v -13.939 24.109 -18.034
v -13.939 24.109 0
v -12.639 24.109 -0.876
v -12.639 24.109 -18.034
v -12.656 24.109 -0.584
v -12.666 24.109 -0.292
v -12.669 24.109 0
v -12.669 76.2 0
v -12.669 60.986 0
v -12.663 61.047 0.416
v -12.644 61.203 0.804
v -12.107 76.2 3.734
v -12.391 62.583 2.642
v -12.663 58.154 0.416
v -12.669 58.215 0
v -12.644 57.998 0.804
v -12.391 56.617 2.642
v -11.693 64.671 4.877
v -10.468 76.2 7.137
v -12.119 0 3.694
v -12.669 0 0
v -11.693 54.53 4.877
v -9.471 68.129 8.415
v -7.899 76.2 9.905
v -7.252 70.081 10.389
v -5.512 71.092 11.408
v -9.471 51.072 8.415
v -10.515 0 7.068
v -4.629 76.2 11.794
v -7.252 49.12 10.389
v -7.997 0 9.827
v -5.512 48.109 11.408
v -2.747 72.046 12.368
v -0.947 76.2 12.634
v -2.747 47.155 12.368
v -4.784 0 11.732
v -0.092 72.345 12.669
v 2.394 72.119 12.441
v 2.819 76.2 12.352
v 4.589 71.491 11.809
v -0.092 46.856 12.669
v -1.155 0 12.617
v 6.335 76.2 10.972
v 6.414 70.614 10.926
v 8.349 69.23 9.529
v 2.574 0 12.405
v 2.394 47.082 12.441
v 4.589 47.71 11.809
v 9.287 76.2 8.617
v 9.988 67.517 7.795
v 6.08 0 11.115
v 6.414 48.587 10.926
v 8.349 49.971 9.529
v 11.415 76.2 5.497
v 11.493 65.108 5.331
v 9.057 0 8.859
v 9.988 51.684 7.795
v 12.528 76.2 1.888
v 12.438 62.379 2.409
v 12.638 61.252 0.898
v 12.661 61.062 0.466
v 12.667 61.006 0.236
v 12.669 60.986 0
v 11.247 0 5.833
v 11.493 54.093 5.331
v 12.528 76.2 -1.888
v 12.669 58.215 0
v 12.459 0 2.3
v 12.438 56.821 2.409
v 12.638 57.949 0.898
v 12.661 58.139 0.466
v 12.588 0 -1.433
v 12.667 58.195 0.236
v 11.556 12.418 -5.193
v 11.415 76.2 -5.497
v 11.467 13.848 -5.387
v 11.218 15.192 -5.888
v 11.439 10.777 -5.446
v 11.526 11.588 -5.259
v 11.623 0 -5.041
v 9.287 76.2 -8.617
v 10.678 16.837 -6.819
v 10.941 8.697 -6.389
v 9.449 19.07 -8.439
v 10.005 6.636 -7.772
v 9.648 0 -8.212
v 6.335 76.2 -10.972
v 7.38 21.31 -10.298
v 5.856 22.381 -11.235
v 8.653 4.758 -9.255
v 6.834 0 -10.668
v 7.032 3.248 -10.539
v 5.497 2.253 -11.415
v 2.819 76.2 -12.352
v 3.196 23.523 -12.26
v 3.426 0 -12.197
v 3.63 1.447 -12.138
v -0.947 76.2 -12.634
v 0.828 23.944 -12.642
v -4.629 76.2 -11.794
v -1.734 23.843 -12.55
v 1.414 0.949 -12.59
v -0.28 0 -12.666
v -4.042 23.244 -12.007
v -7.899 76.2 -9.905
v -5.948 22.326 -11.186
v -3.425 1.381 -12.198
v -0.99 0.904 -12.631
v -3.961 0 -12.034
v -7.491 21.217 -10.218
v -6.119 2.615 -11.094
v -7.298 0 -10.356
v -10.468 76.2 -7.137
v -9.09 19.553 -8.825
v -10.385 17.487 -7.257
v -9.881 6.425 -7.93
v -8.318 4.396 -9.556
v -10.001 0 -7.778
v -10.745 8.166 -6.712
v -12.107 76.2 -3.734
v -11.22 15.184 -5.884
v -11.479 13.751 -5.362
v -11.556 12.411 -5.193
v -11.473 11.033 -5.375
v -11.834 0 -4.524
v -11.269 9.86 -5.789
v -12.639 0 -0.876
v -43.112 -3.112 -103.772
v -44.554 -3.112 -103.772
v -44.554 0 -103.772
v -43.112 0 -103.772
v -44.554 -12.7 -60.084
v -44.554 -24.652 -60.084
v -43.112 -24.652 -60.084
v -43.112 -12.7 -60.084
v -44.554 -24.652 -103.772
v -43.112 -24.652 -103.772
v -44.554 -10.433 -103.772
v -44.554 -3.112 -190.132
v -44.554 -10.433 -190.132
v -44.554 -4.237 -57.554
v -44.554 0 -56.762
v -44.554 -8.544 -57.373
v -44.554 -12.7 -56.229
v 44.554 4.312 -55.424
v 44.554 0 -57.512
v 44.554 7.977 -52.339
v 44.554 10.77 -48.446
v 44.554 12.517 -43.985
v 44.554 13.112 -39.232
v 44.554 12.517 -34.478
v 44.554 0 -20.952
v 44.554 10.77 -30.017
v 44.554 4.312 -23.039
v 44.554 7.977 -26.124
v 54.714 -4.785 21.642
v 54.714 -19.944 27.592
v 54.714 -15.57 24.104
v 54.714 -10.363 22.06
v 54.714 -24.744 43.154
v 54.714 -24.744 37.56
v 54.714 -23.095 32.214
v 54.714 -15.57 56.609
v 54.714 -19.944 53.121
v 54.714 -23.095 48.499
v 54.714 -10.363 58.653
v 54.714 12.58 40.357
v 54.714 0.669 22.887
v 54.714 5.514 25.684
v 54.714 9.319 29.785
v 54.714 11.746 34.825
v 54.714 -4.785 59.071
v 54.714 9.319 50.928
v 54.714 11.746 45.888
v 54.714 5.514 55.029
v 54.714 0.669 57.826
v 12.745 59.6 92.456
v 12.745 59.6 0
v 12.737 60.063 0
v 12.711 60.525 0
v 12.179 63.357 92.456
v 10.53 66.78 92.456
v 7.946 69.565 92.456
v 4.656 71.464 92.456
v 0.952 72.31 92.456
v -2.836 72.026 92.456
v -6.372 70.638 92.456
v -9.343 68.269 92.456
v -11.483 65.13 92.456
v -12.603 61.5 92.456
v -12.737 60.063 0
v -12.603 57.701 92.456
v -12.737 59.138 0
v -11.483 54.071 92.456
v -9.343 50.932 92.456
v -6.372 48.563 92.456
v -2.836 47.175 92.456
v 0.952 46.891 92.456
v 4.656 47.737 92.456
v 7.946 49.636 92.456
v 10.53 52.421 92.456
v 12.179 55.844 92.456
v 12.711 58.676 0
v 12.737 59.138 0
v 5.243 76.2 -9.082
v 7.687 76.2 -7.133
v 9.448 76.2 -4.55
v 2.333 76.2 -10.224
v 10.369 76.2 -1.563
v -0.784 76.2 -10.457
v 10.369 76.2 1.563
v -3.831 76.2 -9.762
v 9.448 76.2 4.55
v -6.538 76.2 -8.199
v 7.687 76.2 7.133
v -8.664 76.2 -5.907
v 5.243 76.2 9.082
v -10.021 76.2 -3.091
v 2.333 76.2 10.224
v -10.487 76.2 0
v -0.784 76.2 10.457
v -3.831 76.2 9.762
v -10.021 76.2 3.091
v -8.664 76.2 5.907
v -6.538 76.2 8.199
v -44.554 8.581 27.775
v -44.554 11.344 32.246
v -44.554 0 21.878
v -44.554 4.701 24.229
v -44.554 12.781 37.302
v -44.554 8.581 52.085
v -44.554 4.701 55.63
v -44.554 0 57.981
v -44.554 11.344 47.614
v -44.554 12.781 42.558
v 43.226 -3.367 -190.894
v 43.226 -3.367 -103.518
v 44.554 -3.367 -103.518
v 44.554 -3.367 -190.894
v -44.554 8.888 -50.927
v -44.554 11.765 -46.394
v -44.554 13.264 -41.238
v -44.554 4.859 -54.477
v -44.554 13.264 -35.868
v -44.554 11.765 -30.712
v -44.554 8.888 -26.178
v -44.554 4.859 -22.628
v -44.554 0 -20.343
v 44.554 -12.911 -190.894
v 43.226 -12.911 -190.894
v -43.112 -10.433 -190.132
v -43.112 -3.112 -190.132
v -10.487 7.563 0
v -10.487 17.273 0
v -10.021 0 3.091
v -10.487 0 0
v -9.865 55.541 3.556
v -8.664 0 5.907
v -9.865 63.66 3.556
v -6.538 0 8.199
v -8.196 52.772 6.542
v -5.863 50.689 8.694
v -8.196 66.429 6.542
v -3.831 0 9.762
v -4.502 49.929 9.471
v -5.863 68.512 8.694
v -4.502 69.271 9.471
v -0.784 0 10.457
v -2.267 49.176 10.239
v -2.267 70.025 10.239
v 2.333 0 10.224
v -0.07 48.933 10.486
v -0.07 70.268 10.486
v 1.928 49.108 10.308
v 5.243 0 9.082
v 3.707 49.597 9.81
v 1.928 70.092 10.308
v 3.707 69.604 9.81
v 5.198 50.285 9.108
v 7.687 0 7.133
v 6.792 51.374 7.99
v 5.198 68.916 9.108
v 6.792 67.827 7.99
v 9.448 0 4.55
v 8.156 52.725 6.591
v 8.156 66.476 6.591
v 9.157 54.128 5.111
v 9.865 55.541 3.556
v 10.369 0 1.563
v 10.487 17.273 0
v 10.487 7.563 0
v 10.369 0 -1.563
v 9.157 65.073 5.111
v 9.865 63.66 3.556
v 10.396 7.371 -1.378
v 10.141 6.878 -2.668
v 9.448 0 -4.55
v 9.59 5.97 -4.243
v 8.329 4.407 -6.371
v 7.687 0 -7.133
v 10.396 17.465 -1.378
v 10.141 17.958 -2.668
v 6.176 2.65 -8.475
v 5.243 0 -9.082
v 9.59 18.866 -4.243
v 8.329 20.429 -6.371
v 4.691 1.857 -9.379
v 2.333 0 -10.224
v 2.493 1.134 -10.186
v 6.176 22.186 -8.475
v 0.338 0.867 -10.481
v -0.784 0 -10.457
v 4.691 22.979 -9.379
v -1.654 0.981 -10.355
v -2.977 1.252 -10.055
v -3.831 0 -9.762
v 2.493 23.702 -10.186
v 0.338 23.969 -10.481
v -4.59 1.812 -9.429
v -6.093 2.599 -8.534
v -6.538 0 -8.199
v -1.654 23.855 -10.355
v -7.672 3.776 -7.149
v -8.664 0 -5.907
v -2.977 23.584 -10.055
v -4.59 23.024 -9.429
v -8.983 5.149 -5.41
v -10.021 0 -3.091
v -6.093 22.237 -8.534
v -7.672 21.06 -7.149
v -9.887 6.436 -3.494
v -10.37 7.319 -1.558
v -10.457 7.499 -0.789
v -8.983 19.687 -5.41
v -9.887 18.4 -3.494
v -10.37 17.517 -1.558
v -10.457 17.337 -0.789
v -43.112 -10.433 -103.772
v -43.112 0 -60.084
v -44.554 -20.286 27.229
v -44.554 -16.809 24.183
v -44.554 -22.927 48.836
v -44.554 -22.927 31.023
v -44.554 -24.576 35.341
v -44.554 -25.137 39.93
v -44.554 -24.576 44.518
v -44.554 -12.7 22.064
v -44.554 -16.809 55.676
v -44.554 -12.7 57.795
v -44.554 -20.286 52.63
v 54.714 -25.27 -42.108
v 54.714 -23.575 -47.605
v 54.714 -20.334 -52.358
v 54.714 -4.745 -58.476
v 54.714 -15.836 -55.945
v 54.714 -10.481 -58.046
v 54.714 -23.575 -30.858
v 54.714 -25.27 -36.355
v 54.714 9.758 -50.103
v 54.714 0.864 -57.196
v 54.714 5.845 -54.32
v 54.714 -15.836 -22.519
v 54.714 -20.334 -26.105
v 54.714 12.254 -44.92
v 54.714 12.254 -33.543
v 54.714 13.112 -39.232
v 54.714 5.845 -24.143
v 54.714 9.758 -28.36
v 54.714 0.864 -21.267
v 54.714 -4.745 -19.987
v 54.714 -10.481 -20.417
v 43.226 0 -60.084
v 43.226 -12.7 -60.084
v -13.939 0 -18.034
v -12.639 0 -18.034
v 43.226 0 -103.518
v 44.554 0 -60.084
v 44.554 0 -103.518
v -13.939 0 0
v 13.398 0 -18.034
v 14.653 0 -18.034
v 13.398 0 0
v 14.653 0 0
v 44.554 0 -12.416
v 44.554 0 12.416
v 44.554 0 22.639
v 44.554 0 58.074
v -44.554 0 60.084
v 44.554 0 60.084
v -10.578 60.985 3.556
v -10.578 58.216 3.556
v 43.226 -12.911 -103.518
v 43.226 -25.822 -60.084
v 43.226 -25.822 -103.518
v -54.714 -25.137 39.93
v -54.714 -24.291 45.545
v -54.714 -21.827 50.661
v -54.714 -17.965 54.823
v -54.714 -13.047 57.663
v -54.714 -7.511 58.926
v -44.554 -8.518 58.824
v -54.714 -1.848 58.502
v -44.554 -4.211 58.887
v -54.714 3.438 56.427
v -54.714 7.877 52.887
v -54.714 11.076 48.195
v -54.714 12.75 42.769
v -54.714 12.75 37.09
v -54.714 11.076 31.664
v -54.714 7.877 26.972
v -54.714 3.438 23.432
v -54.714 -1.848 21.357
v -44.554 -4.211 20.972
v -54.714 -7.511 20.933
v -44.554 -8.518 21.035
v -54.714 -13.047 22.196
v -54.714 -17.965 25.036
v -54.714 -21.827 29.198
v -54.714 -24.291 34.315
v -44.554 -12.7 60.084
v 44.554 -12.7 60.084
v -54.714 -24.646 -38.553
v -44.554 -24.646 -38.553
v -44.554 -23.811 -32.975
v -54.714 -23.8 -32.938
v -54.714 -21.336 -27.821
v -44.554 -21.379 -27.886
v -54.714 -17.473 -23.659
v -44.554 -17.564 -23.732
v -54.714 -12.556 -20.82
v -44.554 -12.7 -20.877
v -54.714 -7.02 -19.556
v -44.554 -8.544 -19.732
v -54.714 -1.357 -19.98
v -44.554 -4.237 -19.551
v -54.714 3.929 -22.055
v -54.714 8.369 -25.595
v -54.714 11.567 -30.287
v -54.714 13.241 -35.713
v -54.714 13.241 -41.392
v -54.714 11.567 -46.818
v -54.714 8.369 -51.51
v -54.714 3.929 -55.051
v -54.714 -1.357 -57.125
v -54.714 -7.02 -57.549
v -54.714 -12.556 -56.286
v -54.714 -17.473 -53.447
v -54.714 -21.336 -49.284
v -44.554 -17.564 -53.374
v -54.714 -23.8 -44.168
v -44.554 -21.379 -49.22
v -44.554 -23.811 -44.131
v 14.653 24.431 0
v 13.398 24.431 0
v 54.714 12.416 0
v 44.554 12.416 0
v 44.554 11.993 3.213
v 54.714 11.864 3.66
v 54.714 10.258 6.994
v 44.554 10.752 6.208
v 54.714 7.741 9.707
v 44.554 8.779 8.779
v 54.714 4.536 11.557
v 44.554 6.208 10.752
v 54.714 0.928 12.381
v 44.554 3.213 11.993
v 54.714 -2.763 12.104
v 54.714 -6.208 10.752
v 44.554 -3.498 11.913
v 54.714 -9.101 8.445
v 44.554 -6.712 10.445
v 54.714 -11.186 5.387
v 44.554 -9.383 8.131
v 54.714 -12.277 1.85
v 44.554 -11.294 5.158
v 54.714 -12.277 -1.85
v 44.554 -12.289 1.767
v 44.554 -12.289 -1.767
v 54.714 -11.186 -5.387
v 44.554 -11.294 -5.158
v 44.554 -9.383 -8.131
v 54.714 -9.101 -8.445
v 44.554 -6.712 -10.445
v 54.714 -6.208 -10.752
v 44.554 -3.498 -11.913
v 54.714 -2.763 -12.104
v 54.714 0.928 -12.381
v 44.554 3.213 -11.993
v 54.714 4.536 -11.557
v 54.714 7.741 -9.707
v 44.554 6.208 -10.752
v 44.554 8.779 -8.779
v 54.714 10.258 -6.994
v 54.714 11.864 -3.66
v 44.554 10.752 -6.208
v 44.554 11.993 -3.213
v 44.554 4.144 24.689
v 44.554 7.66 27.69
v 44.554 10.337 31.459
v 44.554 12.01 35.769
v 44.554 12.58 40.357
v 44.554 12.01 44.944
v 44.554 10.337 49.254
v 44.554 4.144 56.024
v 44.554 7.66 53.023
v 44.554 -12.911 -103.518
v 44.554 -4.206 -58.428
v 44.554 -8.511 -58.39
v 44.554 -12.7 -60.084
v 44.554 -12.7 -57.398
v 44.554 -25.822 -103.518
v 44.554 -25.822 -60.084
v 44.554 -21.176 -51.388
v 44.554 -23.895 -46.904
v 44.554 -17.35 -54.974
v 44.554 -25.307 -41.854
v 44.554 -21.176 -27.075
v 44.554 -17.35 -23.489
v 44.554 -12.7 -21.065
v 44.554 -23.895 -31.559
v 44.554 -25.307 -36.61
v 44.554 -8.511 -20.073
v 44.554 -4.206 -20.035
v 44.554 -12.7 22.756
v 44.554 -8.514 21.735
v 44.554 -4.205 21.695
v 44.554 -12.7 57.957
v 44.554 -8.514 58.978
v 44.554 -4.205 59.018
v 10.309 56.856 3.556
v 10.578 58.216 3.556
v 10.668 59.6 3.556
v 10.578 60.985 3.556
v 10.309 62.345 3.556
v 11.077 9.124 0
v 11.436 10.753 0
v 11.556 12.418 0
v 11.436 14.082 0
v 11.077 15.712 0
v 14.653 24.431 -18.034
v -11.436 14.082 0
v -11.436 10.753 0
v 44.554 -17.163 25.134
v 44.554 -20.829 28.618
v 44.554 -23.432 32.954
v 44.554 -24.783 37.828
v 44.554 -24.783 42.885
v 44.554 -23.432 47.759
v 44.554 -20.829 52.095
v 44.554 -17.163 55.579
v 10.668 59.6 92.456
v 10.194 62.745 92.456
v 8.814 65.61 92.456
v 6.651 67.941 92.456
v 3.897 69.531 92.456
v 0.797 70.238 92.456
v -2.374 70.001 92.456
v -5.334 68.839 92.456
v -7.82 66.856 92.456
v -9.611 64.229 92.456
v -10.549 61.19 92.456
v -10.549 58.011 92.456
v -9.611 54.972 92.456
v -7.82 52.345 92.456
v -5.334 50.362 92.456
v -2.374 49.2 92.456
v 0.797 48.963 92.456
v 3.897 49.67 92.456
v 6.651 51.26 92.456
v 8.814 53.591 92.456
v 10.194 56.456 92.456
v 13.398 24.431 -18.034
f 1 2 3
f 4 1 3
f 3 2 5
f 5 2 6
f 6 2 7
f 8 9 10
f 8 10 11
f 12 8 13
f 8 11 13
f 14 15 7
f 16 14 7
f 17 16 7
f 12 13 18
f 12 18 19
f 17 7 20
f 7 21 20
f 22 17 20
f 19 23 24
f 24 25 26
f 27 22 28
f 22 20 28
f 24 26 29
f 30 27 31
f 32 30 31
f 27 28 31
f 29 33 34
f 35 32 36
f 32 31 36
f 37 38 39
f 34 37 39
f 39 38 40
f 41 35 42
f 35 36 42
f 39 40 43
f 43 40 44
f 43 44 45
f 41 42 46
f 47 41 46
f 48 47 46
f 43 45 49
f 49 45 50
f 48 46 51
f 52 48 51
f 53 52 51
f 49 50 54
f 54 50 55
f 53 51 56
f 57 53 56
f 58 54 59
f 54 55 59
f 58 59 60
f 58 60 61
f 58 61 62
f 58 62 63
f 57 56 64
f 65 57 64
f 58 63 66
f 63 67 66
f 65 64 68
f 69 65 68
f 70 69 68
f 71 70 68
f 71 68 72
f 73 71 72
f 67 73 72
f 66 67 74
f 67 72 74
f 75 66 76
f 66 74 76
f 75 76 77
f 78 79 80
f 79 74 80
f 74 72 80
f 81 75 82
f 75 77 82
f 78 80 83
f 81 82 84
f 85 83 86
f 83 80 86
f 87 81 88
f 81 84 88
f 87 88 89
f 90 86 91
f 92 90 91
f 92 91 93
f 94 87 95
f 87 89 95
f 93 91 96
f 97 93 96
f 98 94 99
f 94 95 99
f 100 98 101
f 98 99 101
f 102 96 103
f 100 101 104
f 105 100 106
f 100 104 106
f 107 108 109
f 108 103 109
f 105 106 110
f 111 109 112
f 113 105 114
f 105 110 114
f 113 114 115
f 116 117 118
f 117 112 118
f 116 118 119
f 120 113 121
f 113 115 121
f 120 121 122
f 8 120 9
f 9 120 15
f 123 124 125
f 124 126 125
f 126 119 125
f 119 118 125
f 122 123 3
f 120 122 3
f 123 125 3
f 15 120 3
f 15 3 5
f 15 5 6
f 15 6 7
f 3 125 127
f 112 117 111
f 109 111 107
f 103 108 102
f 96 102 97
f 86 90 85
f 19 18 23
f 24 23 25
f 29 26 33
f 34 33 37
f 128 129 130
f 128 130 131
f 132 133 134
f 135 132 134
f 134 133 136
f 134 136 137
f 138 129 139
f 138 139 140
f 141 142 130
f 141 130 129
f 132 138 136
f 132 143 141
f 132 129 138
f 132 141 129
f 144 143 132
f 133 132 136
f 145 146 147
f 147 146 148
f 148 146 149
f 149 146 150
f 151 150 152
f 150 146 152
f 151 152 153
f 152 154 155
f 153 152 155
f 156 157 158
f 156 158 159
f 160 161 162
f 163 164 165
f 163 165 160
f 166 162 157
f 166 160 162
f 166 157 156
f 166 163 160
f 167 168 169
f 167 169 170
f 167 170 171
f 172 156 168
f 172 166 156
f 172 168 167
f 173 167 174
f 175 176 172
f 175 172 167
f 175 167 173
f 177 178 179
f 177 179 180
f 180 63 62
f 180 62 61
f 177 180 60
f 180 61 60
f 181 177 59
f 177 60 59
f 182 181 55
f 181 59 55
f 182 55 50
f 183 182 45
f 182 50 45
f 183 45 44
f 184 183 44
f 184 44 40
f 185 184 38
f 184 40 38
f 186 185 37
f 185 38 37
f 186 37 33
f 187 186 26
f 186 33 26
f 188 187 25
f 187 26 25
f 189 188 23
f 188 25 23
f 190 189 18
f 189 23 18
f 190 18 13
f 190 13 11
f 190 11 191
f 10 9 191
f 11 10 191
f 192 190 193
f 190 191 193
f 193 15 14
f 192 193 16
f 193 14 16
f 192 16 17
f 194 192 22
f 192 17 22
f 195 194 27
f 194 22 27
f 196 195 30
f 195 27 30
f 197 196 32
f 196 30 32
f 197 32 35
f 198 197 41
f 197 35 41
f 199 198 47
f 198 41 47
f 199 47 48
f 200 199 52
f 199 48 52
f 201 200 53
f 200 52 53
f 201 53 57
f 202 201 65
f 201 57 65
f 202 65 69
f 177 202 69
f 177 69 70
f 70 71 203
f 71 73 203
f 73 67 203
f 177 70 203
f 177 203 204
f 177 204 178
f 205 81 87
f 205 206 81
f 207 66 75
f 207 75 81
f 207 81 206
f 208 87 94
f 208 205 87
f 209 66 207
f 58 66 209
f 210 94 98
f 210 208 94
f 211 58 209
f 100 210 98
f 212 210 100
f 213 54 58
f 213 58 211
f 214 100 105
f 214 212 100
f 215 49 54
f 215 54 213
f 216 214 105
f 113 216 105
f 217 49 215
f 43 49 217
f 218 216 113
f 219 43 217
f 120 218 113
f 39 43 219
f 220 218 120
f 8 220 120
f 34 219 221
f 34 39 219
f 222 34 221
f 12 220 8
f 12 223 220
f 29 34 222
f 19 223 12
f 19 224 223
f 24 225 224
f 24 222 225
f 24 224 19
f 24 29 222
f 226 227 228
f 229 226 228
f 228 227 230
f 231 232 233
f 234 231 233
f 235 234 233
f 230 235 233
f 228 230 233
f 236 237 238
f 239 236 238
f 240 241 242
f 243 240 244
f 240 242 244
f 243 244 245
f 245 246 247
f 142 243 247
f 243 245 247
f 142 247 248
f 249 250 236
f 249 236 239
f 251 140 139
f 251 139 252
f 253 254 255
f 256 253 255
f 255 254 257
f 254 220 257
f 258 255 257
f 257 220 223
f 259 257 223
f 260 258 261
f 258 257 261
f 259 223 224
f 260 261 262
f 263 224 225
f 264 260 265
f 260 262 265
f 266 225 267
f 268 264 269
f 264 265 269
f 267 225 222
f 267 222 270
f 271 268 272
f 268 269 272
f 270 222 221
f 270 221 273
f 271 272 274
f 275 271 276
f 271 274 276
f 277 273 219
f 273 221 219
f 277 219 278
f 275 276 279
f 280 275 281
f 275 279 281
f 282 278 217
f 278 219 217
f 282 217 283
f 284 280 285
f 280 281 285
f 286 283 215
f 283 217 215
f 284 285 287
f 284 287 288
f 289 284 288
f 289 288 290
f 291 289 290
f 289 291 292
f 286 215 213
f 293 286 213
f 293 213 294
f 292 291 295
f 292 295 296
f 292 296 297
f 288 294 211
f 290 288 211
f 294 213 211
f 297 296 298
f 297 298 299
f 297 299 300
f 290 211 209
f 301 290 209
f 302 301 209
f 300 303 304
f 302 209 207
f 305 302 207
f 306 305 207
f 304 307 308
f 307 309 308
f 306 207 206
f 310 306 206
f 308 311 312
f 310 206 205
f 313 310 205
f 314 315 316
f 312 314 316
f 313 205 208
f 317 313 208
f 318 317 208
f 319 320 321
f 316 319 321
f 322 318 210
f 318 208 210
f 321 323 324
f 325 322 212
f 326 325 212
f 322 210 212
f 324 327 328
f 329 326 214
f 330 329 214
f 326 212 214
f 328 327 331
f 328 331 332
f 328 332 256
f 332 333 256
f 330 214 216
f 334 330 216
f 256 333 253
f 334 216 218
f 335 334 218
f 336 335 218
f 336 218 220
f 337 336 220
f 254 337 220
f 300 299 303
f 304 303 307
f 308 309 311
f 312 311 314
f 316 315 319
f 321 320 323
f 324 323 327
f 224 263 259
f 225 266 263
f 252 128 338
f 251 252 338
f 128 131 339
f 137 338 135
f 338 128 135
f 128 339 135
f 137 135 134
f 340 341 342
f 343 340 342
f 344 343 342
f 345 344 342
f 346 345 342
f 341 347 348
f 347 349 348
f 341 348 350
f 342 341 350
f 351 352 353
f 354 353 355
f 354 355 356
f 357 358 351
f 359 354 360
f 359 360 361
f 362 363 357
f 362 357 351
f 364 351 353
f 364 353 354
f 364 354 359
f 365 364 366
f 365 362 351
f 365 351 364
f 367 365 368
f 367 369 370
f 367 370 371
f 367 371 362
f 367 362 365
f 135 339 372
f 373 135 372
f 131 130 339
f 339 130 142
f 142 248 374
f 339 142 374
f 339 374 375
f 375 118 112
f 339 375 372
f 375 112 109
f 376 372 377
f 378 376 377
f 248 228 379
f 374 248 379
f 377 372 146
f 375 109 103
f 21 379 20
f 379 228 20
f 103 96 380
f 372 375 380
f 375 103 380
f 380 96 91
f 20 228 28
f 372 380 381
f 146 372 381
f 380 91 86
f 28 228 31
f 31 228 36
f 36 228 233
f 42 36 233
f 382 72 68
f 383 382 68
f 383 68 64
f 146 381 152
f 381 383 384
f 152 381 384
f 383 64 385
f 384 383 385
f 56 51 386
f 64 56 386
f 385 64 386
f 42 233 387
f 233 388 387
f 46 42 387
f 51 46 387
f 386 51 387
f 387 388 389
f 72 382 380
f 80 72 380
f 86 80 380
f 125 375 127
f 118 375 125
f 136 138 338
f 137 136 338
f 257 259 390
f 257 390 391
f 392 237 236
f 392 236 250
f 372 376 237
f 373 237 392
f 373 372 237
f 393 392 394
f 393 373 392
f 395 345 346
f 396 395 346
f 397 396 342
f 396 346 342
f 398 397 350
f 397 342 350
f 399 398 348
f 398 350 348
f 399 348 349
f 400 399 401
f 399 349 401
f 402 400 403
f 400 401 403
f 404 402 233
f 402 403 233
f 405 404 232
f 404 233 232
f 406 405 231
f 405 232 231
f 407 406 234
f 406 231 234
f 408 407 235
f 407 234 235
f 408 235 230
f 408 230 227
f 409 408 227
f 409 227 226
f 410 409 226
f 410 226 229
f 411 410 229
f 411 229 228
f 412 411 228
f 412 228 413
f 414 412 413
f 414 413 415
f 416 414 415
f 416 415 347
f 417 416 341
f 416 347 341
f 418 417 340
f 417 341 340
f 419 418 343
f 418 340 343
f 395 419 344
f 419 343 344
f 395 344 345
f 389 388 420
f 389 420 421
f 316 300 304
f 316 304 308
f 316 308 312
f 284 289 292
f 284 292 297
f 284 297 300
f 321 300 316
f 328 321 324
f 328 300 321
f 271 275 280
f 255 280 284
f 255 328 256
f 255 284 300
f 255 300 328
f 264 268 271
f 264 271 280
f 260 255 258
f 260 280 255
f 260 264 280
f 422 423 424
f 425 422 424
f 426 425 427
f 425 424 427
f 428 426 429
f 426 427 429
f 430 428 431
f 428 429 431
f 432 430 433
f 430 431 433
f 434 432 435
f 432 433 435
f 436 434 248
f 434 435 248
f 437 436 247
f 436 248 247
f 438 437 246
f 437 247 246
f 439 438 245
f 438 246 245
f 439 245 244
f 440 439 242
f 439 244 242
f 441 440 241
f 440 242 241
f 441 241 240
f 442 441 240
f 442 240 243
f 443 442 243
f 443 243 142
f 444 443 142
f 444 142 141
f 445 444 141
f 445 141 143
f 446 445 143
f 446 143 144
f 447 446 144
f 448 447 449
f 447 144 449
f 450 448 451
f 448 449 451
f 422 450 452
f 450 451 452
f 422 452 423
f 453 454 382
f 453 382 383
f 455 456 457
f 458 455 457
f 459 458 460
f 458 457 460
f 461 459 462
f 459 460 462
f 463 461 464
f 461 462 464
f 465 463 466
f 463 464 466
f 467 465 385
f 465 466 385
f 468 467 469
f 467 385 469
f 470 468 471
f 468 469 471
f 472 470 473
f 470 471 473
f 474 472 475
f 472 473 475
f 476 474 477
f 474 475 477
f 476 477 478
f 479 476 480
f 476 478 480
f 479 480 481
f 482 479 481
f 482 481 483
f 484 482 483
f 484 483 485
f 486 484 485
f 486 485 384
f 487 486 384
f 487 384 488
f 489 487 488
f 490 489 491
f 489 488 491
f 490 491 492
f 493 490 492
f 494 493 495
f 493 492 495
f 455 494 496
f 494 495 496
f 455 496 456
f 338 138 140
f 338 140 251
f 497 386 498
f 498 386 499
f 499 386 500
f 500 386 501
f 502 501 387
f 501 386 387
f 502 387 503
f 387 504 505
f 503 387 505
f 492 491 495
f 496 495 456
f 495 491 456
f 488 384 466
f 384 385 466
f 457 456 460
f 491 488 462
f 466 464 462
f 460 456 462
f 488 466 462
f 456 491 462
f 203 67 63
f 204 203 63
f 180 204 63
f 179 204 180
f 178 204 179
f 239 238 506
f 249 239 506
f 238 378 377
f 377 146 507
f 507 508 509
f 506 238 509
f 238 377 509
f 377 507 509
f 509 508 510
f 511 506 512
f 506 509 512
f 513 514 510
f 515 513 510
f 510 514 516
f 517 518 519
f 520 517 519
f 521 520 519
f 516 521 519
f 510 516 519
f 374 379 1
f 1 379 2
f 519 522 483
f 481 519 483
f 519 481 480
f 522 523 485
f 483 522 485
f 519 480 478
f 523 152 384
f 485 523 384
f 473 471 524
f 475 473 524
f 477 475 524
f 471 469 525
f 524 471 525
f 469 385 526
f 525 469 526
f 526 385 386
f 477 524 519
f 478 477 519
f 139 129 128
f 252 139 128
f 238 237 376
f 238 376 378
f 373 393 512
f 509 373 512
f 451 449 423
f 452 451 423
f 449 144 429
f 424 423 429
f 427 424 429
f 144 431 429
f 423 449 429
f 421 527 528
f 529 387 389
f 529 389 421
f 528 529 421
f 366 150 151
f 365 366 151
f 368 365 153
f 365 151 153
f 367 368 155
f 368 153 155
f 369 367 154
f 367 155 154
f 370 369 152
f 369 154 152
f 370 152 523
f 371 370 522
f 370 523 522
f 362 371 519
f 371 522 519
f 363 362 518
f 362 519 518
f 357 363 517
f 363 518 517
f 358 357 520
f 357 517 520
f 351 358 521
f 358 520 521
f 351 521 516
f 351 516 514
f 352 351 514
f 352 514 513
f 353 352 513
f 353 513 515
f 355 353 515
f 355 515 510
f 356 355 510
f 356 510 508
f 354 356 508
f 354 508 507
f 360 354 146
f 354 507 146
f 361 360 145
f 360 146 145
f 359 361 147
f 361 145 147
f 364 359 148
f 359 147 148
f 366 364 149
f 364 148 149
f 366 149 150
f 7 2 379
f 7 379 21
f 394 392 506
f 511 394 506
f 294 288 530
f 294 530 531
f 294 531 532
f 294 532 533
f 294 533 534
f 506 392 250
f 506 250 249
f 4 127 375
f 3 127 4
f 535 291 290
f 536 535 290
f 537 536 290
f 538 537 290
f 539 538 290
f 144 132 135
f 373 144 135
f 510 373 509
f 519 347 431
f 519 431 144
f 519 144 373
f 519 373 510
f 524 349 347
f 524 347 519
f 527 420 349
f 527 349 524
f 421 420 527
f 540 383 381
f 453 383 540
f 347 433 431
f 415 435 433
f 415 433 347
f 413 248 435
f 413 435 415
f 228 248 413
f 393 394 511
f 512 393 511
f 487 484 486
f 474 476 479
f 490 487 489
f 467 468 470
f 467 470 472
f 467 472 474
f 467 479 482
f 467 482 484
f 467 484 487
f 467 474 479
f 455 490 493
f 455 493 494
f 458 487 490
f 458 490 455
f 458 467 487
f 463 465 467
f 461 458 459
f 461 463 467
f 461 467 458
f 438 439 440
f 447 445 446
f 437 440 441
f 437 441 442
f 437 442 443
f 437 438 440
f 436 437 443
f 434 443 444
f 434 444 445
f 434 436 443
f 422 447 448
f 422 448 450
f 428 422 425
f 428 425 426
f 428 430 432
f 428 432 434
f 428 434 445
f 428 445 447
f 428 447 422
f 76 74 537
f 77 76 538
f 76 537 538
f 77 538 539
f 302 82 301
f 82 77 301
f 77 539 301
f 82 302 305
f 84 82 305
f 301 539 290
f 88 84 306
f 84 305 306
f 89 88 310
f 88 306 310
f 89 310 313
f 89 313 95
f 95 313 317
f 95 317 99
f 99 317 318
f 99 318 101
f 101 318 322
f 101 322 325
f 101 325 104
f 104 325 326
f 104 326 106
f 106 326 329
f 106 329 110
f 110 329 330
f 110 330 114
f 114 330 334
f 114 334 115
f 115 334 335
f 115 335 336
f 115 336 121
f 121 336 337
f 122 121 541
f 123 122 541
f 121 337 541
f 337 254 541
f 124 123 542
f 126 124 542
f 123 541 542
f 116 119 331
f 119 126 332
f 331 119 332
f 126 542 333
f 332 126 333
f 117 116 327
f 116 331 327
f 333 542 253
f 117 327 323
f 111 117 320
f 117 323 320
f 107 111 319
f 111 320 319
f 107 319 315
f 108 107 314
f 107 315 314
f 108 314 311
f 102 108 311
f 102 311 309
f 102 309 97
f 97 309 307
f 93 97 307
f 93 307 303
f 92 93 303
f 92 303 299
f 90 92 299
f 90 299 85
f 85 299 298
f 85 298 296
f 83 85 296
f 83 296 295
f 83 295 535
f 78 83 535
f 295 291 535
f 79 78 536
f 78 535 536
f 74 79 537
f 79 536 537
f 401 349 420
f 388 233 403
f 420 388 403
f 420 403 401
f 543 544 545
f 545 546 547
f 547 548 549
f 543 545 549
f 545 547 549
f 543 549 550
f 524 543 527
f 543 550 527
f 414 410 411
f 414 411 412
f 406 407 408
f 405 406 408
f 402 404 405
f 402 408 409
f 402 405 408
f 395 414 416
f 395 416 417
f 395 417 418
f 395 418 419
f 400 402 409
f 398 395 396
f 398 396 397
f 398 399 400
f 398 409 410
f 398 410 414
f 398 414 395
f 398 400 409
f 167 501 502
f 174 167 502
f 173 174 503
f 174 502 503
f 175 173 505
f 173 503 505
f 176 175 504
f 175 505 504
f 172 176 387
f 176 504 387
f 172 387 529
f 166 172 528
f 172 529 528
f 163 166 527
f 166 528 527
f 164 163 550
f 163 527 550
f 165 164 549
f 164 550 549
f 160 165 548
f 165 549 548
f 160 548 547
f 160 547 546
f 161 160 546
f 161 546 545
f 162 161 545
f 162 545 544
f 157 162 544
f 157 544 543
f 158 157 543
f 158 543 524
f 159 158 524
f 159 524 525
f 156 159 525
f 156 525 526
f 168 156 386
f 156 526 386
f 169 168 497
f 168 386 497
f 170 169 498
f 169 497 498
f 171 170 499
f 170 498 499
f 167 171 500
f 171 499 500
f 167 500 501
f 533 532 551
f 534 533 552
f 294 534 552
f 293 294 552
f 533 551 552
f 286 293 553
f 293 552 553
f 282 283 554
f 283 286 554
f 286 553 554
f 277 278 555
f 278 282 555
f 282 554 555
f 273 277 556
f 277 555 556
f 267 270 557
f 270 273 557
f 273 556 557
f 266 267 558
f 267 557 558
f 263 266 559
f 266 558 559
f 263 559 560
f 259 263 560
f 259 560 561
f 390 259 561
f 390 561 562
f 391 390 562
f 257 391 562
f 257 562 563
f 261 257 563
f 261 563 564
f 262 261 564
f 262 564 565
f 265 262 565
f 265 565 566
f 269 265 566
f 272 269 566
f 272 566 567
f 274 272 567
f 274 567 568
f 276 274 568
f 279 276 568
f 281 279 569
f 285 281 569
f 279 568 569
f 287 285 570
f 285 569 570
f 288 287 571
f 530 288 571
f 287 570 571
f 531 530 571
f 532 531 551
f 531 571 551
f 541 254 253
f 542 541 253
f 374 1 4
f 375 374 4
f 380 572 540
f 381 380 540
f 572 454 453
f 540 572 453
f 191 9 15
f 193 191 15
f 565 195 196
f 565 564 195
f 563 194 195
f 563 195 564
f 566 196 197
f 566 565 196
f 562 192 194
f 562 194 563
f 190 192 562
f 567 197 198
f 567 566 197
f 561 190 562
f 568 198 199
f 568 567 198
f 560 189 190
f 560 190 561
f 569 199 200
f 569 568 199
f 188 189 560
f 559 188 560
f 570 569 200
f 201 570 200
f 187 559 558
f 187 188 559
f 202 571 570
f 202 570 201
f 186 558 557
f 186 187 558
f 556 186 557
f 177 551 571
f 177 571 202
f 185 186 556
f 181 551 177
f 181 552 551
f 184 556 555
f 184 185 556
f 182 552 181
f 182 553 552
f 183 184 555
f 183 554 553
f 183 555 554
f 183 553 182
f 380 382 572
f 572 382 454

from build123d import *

# Parameters (mm, degrees)
F0_W      = 89.10818398
F0_H      = 120.1675757766
F1_DEPTH  = 12.7
F2_R      = 19.05
F3_DEPTH  = 10.16
F4_R      = 19.05
F5_DEPTH  = 10.16
F6_R      = 18.7667167596
F7_DEPTH  = 10.16
F8_R      = 19.2986234131
F9_DEPTH  = 10.16
F10_R     = 12.4156573735
F11_DEPTH = 10.16
F12_R     = 12.6694142054
F13_DEPTH = 76.2
F14_R     = 12.7449680287
F15_DEPTH = 92.456
F16_R     = 10.4865516495
F17_DEPTH = 76.2
F18_R     = 10.6677127508
F19_DEPTH = 88.9
F20_R     = 11.5560475943
F21_DEPTH = 25.4
F24_W     = 1.3282671571
F24_H     = 25.8222837001
F25_DEPTH = 43.434
F26_W     = 1.4417506754
F26_H     = 24.6515385807
F27_DEPTH = 43.688
F22_W     = 1.255504787
F22_H     = 24.4307331741
F30_DEPTH = 18.034
F23_W     = 1.2999391183
F23_H     = 24.1094622761
F31_DEPTH = 18.034
F36_W     = 1.3282671571
F36_H     = 9.5440435689
F37_DEPTH = 87.376
F38_W     = 1.4417506754
F38_H     = 7.3205276858
F39_DEPTH = 86.36


# Not quite as in the source:
# - the program builds the solid bodies; features that only make, move or delete a surface that nothing else refers to are left out


with BuildPart() as f1:
    # F0 (on Front) → F1 (new body)
    with BuildSketch(Plane.XZ):
        Rectangle(F0_W, F0_H)
    extrude(amount=F1_DEPTH)

    # F2 (on face) → F3 (join)
    with BuildSketch(Plane(origin=(-44.55409199, 0, 0), x_dir=(0, -1, 0), z_dir=(-1, 0, 0))):
        with Locations((6.0873422772, 39.9295948446)):
            Circle(F2_R)
    extrude(amount=F3_DEPTH)

    # F4 (on face) → F5 (join)
    with BuildSketch(Plane(origin=(-44.55409199, 0, 0), x_dir=(0, -1, 0), z_dir=(-1, 0, 0))):
        with Locations((5.5960081518, -38.5527424514)):
            Circle(F4_R)
    extrude(amount=F5_DEPTH)

    # F6 (on face) → F7 (join)
    with BuildSketch(Plane.YZ.offset(44.55409199)):
        with Locations((-6.1870645732, 40.3565391898)):
            Circle(F6_R)
    extrude(amount=F7_DEPTH)

    # F8 (on face) → F9 (join)
    with BuildSketch(Plane.YZ.offset(44.55409199)):
        with Locations((-6.1870645732, -39.2316170037)):
            Circle(F8_R)
    extrude(amount=F9_DEPTH)

    # F10 (on face) → F11 (join)
    with BuildSketch(Plane.YZ.offset(44.55409199)):
        Circle(F10_R)
    extrude(amount=F11_DEPTH)

    # F12 (on face) → F13 (join)
    with BuildSketch(Plane(origin=(0, 0, 0), x_dir=(-1, 0, 0), z_dir=(0, 1, 0))):
        Circle(F12_R)
    extrude(amount=F13_DEPTH)

    # F14 (on Top) → F15 (join)
    with BuildSketch(Plane.XY):
        with Locations((0, 59.6004612744)):
            Circle(F14_R)
    extrude(amount=F15_DEPTH)

    # F16 (on face) → F17 (cut)
    with BuildSketch(Plane(origin=(0, 76.2, 0), x_dir=(-1, 0, 0), z_dir=(0, 1, 0))):
        Circle(F16_R)
    extrude(amount=-F17_DEPTH, mode=Mode.SUBTRACT)

    # F18 (on face) → F19 (cut)
    with BuildSketch(Plane.XY.offset(92.456)):
        with Locations((0, 59.6004612744)):
            Circle(F18_R)
    extrude(amount=-F19_DEPTH, mode=Mode.SUBTRACT)

    # F20 (on Top) → F21 (cut)
    with BuildSketch(Plane.XY):
        with Locations((0, 12.4179841951)):
            Circle(F20_R)
    extrude(amount=-F21_DEPTH, mode=Mode.SUBTRACT)

    # F24 (on face) → F25 (join)
    with BuildSketch(Plane(origin=(0, 0, -60.0837878883), x_dir=(1, 0, 0), z_dir=(0, 0, -1))):
        with Locations((43.8899584115, 12.9111418501)):
            Rectangle(F24_W, F24_H)
    extrude(amount=F25_DEPTH)

    # F26 (on face) → F27 (join)
    with BuildSketch(Plane(origin=(0, 0, -60.0837878883), x_dir=(1, 0, 0), z_dir=(0, 0, -1))):
        with Locations((-43.8332166523, 12.3257692903)):
            Rectangle(F26_W, F26_H)
    extrude(amount=F27_DEPTH)

    # F22 (on Top) → F30 (join)
    with BuildSketch(Plane.XY):
        with Locations((14.0256239101, 12.215366587)):
            Rectangle(F22_W, F22_H)
    extrude(amount=-F30_DEPTH)

    # F23 (on Top) → F31 (join)
    with BuildSketch(Plane.XY):
        with Locations((-13.2890497334, 12.0547311381)):
            Rectangle(F23_W, F23_H)
    extrude(amount=-F31_DEPTH)

    # F36 (on face) → F37 (join)
    with BuildSketch(Plane(origin=(0, 0, -103.5177878883), x_dir=(1, 0, 0), z_dir=(0, 0, -1))):
        with Locations((43.8899584115, 8.1391200656)):
            Rectangle(F36_W, F36_H)
    extrude(amount=F37_DEPTH)

    # F38 (on face) → F39 (join)
    with BuildSketch(Plane(origin=(0, 0, -103.7717878883), x_dir=(1, 0, 0), z_dir=(0, 0, -1))):
        with Locations((-43.8332166523, 6.7722700769)):
            Rectangle(F38_W, F38_H)
    extrude(amount=F39_DEPTH)


solid = f1.part
